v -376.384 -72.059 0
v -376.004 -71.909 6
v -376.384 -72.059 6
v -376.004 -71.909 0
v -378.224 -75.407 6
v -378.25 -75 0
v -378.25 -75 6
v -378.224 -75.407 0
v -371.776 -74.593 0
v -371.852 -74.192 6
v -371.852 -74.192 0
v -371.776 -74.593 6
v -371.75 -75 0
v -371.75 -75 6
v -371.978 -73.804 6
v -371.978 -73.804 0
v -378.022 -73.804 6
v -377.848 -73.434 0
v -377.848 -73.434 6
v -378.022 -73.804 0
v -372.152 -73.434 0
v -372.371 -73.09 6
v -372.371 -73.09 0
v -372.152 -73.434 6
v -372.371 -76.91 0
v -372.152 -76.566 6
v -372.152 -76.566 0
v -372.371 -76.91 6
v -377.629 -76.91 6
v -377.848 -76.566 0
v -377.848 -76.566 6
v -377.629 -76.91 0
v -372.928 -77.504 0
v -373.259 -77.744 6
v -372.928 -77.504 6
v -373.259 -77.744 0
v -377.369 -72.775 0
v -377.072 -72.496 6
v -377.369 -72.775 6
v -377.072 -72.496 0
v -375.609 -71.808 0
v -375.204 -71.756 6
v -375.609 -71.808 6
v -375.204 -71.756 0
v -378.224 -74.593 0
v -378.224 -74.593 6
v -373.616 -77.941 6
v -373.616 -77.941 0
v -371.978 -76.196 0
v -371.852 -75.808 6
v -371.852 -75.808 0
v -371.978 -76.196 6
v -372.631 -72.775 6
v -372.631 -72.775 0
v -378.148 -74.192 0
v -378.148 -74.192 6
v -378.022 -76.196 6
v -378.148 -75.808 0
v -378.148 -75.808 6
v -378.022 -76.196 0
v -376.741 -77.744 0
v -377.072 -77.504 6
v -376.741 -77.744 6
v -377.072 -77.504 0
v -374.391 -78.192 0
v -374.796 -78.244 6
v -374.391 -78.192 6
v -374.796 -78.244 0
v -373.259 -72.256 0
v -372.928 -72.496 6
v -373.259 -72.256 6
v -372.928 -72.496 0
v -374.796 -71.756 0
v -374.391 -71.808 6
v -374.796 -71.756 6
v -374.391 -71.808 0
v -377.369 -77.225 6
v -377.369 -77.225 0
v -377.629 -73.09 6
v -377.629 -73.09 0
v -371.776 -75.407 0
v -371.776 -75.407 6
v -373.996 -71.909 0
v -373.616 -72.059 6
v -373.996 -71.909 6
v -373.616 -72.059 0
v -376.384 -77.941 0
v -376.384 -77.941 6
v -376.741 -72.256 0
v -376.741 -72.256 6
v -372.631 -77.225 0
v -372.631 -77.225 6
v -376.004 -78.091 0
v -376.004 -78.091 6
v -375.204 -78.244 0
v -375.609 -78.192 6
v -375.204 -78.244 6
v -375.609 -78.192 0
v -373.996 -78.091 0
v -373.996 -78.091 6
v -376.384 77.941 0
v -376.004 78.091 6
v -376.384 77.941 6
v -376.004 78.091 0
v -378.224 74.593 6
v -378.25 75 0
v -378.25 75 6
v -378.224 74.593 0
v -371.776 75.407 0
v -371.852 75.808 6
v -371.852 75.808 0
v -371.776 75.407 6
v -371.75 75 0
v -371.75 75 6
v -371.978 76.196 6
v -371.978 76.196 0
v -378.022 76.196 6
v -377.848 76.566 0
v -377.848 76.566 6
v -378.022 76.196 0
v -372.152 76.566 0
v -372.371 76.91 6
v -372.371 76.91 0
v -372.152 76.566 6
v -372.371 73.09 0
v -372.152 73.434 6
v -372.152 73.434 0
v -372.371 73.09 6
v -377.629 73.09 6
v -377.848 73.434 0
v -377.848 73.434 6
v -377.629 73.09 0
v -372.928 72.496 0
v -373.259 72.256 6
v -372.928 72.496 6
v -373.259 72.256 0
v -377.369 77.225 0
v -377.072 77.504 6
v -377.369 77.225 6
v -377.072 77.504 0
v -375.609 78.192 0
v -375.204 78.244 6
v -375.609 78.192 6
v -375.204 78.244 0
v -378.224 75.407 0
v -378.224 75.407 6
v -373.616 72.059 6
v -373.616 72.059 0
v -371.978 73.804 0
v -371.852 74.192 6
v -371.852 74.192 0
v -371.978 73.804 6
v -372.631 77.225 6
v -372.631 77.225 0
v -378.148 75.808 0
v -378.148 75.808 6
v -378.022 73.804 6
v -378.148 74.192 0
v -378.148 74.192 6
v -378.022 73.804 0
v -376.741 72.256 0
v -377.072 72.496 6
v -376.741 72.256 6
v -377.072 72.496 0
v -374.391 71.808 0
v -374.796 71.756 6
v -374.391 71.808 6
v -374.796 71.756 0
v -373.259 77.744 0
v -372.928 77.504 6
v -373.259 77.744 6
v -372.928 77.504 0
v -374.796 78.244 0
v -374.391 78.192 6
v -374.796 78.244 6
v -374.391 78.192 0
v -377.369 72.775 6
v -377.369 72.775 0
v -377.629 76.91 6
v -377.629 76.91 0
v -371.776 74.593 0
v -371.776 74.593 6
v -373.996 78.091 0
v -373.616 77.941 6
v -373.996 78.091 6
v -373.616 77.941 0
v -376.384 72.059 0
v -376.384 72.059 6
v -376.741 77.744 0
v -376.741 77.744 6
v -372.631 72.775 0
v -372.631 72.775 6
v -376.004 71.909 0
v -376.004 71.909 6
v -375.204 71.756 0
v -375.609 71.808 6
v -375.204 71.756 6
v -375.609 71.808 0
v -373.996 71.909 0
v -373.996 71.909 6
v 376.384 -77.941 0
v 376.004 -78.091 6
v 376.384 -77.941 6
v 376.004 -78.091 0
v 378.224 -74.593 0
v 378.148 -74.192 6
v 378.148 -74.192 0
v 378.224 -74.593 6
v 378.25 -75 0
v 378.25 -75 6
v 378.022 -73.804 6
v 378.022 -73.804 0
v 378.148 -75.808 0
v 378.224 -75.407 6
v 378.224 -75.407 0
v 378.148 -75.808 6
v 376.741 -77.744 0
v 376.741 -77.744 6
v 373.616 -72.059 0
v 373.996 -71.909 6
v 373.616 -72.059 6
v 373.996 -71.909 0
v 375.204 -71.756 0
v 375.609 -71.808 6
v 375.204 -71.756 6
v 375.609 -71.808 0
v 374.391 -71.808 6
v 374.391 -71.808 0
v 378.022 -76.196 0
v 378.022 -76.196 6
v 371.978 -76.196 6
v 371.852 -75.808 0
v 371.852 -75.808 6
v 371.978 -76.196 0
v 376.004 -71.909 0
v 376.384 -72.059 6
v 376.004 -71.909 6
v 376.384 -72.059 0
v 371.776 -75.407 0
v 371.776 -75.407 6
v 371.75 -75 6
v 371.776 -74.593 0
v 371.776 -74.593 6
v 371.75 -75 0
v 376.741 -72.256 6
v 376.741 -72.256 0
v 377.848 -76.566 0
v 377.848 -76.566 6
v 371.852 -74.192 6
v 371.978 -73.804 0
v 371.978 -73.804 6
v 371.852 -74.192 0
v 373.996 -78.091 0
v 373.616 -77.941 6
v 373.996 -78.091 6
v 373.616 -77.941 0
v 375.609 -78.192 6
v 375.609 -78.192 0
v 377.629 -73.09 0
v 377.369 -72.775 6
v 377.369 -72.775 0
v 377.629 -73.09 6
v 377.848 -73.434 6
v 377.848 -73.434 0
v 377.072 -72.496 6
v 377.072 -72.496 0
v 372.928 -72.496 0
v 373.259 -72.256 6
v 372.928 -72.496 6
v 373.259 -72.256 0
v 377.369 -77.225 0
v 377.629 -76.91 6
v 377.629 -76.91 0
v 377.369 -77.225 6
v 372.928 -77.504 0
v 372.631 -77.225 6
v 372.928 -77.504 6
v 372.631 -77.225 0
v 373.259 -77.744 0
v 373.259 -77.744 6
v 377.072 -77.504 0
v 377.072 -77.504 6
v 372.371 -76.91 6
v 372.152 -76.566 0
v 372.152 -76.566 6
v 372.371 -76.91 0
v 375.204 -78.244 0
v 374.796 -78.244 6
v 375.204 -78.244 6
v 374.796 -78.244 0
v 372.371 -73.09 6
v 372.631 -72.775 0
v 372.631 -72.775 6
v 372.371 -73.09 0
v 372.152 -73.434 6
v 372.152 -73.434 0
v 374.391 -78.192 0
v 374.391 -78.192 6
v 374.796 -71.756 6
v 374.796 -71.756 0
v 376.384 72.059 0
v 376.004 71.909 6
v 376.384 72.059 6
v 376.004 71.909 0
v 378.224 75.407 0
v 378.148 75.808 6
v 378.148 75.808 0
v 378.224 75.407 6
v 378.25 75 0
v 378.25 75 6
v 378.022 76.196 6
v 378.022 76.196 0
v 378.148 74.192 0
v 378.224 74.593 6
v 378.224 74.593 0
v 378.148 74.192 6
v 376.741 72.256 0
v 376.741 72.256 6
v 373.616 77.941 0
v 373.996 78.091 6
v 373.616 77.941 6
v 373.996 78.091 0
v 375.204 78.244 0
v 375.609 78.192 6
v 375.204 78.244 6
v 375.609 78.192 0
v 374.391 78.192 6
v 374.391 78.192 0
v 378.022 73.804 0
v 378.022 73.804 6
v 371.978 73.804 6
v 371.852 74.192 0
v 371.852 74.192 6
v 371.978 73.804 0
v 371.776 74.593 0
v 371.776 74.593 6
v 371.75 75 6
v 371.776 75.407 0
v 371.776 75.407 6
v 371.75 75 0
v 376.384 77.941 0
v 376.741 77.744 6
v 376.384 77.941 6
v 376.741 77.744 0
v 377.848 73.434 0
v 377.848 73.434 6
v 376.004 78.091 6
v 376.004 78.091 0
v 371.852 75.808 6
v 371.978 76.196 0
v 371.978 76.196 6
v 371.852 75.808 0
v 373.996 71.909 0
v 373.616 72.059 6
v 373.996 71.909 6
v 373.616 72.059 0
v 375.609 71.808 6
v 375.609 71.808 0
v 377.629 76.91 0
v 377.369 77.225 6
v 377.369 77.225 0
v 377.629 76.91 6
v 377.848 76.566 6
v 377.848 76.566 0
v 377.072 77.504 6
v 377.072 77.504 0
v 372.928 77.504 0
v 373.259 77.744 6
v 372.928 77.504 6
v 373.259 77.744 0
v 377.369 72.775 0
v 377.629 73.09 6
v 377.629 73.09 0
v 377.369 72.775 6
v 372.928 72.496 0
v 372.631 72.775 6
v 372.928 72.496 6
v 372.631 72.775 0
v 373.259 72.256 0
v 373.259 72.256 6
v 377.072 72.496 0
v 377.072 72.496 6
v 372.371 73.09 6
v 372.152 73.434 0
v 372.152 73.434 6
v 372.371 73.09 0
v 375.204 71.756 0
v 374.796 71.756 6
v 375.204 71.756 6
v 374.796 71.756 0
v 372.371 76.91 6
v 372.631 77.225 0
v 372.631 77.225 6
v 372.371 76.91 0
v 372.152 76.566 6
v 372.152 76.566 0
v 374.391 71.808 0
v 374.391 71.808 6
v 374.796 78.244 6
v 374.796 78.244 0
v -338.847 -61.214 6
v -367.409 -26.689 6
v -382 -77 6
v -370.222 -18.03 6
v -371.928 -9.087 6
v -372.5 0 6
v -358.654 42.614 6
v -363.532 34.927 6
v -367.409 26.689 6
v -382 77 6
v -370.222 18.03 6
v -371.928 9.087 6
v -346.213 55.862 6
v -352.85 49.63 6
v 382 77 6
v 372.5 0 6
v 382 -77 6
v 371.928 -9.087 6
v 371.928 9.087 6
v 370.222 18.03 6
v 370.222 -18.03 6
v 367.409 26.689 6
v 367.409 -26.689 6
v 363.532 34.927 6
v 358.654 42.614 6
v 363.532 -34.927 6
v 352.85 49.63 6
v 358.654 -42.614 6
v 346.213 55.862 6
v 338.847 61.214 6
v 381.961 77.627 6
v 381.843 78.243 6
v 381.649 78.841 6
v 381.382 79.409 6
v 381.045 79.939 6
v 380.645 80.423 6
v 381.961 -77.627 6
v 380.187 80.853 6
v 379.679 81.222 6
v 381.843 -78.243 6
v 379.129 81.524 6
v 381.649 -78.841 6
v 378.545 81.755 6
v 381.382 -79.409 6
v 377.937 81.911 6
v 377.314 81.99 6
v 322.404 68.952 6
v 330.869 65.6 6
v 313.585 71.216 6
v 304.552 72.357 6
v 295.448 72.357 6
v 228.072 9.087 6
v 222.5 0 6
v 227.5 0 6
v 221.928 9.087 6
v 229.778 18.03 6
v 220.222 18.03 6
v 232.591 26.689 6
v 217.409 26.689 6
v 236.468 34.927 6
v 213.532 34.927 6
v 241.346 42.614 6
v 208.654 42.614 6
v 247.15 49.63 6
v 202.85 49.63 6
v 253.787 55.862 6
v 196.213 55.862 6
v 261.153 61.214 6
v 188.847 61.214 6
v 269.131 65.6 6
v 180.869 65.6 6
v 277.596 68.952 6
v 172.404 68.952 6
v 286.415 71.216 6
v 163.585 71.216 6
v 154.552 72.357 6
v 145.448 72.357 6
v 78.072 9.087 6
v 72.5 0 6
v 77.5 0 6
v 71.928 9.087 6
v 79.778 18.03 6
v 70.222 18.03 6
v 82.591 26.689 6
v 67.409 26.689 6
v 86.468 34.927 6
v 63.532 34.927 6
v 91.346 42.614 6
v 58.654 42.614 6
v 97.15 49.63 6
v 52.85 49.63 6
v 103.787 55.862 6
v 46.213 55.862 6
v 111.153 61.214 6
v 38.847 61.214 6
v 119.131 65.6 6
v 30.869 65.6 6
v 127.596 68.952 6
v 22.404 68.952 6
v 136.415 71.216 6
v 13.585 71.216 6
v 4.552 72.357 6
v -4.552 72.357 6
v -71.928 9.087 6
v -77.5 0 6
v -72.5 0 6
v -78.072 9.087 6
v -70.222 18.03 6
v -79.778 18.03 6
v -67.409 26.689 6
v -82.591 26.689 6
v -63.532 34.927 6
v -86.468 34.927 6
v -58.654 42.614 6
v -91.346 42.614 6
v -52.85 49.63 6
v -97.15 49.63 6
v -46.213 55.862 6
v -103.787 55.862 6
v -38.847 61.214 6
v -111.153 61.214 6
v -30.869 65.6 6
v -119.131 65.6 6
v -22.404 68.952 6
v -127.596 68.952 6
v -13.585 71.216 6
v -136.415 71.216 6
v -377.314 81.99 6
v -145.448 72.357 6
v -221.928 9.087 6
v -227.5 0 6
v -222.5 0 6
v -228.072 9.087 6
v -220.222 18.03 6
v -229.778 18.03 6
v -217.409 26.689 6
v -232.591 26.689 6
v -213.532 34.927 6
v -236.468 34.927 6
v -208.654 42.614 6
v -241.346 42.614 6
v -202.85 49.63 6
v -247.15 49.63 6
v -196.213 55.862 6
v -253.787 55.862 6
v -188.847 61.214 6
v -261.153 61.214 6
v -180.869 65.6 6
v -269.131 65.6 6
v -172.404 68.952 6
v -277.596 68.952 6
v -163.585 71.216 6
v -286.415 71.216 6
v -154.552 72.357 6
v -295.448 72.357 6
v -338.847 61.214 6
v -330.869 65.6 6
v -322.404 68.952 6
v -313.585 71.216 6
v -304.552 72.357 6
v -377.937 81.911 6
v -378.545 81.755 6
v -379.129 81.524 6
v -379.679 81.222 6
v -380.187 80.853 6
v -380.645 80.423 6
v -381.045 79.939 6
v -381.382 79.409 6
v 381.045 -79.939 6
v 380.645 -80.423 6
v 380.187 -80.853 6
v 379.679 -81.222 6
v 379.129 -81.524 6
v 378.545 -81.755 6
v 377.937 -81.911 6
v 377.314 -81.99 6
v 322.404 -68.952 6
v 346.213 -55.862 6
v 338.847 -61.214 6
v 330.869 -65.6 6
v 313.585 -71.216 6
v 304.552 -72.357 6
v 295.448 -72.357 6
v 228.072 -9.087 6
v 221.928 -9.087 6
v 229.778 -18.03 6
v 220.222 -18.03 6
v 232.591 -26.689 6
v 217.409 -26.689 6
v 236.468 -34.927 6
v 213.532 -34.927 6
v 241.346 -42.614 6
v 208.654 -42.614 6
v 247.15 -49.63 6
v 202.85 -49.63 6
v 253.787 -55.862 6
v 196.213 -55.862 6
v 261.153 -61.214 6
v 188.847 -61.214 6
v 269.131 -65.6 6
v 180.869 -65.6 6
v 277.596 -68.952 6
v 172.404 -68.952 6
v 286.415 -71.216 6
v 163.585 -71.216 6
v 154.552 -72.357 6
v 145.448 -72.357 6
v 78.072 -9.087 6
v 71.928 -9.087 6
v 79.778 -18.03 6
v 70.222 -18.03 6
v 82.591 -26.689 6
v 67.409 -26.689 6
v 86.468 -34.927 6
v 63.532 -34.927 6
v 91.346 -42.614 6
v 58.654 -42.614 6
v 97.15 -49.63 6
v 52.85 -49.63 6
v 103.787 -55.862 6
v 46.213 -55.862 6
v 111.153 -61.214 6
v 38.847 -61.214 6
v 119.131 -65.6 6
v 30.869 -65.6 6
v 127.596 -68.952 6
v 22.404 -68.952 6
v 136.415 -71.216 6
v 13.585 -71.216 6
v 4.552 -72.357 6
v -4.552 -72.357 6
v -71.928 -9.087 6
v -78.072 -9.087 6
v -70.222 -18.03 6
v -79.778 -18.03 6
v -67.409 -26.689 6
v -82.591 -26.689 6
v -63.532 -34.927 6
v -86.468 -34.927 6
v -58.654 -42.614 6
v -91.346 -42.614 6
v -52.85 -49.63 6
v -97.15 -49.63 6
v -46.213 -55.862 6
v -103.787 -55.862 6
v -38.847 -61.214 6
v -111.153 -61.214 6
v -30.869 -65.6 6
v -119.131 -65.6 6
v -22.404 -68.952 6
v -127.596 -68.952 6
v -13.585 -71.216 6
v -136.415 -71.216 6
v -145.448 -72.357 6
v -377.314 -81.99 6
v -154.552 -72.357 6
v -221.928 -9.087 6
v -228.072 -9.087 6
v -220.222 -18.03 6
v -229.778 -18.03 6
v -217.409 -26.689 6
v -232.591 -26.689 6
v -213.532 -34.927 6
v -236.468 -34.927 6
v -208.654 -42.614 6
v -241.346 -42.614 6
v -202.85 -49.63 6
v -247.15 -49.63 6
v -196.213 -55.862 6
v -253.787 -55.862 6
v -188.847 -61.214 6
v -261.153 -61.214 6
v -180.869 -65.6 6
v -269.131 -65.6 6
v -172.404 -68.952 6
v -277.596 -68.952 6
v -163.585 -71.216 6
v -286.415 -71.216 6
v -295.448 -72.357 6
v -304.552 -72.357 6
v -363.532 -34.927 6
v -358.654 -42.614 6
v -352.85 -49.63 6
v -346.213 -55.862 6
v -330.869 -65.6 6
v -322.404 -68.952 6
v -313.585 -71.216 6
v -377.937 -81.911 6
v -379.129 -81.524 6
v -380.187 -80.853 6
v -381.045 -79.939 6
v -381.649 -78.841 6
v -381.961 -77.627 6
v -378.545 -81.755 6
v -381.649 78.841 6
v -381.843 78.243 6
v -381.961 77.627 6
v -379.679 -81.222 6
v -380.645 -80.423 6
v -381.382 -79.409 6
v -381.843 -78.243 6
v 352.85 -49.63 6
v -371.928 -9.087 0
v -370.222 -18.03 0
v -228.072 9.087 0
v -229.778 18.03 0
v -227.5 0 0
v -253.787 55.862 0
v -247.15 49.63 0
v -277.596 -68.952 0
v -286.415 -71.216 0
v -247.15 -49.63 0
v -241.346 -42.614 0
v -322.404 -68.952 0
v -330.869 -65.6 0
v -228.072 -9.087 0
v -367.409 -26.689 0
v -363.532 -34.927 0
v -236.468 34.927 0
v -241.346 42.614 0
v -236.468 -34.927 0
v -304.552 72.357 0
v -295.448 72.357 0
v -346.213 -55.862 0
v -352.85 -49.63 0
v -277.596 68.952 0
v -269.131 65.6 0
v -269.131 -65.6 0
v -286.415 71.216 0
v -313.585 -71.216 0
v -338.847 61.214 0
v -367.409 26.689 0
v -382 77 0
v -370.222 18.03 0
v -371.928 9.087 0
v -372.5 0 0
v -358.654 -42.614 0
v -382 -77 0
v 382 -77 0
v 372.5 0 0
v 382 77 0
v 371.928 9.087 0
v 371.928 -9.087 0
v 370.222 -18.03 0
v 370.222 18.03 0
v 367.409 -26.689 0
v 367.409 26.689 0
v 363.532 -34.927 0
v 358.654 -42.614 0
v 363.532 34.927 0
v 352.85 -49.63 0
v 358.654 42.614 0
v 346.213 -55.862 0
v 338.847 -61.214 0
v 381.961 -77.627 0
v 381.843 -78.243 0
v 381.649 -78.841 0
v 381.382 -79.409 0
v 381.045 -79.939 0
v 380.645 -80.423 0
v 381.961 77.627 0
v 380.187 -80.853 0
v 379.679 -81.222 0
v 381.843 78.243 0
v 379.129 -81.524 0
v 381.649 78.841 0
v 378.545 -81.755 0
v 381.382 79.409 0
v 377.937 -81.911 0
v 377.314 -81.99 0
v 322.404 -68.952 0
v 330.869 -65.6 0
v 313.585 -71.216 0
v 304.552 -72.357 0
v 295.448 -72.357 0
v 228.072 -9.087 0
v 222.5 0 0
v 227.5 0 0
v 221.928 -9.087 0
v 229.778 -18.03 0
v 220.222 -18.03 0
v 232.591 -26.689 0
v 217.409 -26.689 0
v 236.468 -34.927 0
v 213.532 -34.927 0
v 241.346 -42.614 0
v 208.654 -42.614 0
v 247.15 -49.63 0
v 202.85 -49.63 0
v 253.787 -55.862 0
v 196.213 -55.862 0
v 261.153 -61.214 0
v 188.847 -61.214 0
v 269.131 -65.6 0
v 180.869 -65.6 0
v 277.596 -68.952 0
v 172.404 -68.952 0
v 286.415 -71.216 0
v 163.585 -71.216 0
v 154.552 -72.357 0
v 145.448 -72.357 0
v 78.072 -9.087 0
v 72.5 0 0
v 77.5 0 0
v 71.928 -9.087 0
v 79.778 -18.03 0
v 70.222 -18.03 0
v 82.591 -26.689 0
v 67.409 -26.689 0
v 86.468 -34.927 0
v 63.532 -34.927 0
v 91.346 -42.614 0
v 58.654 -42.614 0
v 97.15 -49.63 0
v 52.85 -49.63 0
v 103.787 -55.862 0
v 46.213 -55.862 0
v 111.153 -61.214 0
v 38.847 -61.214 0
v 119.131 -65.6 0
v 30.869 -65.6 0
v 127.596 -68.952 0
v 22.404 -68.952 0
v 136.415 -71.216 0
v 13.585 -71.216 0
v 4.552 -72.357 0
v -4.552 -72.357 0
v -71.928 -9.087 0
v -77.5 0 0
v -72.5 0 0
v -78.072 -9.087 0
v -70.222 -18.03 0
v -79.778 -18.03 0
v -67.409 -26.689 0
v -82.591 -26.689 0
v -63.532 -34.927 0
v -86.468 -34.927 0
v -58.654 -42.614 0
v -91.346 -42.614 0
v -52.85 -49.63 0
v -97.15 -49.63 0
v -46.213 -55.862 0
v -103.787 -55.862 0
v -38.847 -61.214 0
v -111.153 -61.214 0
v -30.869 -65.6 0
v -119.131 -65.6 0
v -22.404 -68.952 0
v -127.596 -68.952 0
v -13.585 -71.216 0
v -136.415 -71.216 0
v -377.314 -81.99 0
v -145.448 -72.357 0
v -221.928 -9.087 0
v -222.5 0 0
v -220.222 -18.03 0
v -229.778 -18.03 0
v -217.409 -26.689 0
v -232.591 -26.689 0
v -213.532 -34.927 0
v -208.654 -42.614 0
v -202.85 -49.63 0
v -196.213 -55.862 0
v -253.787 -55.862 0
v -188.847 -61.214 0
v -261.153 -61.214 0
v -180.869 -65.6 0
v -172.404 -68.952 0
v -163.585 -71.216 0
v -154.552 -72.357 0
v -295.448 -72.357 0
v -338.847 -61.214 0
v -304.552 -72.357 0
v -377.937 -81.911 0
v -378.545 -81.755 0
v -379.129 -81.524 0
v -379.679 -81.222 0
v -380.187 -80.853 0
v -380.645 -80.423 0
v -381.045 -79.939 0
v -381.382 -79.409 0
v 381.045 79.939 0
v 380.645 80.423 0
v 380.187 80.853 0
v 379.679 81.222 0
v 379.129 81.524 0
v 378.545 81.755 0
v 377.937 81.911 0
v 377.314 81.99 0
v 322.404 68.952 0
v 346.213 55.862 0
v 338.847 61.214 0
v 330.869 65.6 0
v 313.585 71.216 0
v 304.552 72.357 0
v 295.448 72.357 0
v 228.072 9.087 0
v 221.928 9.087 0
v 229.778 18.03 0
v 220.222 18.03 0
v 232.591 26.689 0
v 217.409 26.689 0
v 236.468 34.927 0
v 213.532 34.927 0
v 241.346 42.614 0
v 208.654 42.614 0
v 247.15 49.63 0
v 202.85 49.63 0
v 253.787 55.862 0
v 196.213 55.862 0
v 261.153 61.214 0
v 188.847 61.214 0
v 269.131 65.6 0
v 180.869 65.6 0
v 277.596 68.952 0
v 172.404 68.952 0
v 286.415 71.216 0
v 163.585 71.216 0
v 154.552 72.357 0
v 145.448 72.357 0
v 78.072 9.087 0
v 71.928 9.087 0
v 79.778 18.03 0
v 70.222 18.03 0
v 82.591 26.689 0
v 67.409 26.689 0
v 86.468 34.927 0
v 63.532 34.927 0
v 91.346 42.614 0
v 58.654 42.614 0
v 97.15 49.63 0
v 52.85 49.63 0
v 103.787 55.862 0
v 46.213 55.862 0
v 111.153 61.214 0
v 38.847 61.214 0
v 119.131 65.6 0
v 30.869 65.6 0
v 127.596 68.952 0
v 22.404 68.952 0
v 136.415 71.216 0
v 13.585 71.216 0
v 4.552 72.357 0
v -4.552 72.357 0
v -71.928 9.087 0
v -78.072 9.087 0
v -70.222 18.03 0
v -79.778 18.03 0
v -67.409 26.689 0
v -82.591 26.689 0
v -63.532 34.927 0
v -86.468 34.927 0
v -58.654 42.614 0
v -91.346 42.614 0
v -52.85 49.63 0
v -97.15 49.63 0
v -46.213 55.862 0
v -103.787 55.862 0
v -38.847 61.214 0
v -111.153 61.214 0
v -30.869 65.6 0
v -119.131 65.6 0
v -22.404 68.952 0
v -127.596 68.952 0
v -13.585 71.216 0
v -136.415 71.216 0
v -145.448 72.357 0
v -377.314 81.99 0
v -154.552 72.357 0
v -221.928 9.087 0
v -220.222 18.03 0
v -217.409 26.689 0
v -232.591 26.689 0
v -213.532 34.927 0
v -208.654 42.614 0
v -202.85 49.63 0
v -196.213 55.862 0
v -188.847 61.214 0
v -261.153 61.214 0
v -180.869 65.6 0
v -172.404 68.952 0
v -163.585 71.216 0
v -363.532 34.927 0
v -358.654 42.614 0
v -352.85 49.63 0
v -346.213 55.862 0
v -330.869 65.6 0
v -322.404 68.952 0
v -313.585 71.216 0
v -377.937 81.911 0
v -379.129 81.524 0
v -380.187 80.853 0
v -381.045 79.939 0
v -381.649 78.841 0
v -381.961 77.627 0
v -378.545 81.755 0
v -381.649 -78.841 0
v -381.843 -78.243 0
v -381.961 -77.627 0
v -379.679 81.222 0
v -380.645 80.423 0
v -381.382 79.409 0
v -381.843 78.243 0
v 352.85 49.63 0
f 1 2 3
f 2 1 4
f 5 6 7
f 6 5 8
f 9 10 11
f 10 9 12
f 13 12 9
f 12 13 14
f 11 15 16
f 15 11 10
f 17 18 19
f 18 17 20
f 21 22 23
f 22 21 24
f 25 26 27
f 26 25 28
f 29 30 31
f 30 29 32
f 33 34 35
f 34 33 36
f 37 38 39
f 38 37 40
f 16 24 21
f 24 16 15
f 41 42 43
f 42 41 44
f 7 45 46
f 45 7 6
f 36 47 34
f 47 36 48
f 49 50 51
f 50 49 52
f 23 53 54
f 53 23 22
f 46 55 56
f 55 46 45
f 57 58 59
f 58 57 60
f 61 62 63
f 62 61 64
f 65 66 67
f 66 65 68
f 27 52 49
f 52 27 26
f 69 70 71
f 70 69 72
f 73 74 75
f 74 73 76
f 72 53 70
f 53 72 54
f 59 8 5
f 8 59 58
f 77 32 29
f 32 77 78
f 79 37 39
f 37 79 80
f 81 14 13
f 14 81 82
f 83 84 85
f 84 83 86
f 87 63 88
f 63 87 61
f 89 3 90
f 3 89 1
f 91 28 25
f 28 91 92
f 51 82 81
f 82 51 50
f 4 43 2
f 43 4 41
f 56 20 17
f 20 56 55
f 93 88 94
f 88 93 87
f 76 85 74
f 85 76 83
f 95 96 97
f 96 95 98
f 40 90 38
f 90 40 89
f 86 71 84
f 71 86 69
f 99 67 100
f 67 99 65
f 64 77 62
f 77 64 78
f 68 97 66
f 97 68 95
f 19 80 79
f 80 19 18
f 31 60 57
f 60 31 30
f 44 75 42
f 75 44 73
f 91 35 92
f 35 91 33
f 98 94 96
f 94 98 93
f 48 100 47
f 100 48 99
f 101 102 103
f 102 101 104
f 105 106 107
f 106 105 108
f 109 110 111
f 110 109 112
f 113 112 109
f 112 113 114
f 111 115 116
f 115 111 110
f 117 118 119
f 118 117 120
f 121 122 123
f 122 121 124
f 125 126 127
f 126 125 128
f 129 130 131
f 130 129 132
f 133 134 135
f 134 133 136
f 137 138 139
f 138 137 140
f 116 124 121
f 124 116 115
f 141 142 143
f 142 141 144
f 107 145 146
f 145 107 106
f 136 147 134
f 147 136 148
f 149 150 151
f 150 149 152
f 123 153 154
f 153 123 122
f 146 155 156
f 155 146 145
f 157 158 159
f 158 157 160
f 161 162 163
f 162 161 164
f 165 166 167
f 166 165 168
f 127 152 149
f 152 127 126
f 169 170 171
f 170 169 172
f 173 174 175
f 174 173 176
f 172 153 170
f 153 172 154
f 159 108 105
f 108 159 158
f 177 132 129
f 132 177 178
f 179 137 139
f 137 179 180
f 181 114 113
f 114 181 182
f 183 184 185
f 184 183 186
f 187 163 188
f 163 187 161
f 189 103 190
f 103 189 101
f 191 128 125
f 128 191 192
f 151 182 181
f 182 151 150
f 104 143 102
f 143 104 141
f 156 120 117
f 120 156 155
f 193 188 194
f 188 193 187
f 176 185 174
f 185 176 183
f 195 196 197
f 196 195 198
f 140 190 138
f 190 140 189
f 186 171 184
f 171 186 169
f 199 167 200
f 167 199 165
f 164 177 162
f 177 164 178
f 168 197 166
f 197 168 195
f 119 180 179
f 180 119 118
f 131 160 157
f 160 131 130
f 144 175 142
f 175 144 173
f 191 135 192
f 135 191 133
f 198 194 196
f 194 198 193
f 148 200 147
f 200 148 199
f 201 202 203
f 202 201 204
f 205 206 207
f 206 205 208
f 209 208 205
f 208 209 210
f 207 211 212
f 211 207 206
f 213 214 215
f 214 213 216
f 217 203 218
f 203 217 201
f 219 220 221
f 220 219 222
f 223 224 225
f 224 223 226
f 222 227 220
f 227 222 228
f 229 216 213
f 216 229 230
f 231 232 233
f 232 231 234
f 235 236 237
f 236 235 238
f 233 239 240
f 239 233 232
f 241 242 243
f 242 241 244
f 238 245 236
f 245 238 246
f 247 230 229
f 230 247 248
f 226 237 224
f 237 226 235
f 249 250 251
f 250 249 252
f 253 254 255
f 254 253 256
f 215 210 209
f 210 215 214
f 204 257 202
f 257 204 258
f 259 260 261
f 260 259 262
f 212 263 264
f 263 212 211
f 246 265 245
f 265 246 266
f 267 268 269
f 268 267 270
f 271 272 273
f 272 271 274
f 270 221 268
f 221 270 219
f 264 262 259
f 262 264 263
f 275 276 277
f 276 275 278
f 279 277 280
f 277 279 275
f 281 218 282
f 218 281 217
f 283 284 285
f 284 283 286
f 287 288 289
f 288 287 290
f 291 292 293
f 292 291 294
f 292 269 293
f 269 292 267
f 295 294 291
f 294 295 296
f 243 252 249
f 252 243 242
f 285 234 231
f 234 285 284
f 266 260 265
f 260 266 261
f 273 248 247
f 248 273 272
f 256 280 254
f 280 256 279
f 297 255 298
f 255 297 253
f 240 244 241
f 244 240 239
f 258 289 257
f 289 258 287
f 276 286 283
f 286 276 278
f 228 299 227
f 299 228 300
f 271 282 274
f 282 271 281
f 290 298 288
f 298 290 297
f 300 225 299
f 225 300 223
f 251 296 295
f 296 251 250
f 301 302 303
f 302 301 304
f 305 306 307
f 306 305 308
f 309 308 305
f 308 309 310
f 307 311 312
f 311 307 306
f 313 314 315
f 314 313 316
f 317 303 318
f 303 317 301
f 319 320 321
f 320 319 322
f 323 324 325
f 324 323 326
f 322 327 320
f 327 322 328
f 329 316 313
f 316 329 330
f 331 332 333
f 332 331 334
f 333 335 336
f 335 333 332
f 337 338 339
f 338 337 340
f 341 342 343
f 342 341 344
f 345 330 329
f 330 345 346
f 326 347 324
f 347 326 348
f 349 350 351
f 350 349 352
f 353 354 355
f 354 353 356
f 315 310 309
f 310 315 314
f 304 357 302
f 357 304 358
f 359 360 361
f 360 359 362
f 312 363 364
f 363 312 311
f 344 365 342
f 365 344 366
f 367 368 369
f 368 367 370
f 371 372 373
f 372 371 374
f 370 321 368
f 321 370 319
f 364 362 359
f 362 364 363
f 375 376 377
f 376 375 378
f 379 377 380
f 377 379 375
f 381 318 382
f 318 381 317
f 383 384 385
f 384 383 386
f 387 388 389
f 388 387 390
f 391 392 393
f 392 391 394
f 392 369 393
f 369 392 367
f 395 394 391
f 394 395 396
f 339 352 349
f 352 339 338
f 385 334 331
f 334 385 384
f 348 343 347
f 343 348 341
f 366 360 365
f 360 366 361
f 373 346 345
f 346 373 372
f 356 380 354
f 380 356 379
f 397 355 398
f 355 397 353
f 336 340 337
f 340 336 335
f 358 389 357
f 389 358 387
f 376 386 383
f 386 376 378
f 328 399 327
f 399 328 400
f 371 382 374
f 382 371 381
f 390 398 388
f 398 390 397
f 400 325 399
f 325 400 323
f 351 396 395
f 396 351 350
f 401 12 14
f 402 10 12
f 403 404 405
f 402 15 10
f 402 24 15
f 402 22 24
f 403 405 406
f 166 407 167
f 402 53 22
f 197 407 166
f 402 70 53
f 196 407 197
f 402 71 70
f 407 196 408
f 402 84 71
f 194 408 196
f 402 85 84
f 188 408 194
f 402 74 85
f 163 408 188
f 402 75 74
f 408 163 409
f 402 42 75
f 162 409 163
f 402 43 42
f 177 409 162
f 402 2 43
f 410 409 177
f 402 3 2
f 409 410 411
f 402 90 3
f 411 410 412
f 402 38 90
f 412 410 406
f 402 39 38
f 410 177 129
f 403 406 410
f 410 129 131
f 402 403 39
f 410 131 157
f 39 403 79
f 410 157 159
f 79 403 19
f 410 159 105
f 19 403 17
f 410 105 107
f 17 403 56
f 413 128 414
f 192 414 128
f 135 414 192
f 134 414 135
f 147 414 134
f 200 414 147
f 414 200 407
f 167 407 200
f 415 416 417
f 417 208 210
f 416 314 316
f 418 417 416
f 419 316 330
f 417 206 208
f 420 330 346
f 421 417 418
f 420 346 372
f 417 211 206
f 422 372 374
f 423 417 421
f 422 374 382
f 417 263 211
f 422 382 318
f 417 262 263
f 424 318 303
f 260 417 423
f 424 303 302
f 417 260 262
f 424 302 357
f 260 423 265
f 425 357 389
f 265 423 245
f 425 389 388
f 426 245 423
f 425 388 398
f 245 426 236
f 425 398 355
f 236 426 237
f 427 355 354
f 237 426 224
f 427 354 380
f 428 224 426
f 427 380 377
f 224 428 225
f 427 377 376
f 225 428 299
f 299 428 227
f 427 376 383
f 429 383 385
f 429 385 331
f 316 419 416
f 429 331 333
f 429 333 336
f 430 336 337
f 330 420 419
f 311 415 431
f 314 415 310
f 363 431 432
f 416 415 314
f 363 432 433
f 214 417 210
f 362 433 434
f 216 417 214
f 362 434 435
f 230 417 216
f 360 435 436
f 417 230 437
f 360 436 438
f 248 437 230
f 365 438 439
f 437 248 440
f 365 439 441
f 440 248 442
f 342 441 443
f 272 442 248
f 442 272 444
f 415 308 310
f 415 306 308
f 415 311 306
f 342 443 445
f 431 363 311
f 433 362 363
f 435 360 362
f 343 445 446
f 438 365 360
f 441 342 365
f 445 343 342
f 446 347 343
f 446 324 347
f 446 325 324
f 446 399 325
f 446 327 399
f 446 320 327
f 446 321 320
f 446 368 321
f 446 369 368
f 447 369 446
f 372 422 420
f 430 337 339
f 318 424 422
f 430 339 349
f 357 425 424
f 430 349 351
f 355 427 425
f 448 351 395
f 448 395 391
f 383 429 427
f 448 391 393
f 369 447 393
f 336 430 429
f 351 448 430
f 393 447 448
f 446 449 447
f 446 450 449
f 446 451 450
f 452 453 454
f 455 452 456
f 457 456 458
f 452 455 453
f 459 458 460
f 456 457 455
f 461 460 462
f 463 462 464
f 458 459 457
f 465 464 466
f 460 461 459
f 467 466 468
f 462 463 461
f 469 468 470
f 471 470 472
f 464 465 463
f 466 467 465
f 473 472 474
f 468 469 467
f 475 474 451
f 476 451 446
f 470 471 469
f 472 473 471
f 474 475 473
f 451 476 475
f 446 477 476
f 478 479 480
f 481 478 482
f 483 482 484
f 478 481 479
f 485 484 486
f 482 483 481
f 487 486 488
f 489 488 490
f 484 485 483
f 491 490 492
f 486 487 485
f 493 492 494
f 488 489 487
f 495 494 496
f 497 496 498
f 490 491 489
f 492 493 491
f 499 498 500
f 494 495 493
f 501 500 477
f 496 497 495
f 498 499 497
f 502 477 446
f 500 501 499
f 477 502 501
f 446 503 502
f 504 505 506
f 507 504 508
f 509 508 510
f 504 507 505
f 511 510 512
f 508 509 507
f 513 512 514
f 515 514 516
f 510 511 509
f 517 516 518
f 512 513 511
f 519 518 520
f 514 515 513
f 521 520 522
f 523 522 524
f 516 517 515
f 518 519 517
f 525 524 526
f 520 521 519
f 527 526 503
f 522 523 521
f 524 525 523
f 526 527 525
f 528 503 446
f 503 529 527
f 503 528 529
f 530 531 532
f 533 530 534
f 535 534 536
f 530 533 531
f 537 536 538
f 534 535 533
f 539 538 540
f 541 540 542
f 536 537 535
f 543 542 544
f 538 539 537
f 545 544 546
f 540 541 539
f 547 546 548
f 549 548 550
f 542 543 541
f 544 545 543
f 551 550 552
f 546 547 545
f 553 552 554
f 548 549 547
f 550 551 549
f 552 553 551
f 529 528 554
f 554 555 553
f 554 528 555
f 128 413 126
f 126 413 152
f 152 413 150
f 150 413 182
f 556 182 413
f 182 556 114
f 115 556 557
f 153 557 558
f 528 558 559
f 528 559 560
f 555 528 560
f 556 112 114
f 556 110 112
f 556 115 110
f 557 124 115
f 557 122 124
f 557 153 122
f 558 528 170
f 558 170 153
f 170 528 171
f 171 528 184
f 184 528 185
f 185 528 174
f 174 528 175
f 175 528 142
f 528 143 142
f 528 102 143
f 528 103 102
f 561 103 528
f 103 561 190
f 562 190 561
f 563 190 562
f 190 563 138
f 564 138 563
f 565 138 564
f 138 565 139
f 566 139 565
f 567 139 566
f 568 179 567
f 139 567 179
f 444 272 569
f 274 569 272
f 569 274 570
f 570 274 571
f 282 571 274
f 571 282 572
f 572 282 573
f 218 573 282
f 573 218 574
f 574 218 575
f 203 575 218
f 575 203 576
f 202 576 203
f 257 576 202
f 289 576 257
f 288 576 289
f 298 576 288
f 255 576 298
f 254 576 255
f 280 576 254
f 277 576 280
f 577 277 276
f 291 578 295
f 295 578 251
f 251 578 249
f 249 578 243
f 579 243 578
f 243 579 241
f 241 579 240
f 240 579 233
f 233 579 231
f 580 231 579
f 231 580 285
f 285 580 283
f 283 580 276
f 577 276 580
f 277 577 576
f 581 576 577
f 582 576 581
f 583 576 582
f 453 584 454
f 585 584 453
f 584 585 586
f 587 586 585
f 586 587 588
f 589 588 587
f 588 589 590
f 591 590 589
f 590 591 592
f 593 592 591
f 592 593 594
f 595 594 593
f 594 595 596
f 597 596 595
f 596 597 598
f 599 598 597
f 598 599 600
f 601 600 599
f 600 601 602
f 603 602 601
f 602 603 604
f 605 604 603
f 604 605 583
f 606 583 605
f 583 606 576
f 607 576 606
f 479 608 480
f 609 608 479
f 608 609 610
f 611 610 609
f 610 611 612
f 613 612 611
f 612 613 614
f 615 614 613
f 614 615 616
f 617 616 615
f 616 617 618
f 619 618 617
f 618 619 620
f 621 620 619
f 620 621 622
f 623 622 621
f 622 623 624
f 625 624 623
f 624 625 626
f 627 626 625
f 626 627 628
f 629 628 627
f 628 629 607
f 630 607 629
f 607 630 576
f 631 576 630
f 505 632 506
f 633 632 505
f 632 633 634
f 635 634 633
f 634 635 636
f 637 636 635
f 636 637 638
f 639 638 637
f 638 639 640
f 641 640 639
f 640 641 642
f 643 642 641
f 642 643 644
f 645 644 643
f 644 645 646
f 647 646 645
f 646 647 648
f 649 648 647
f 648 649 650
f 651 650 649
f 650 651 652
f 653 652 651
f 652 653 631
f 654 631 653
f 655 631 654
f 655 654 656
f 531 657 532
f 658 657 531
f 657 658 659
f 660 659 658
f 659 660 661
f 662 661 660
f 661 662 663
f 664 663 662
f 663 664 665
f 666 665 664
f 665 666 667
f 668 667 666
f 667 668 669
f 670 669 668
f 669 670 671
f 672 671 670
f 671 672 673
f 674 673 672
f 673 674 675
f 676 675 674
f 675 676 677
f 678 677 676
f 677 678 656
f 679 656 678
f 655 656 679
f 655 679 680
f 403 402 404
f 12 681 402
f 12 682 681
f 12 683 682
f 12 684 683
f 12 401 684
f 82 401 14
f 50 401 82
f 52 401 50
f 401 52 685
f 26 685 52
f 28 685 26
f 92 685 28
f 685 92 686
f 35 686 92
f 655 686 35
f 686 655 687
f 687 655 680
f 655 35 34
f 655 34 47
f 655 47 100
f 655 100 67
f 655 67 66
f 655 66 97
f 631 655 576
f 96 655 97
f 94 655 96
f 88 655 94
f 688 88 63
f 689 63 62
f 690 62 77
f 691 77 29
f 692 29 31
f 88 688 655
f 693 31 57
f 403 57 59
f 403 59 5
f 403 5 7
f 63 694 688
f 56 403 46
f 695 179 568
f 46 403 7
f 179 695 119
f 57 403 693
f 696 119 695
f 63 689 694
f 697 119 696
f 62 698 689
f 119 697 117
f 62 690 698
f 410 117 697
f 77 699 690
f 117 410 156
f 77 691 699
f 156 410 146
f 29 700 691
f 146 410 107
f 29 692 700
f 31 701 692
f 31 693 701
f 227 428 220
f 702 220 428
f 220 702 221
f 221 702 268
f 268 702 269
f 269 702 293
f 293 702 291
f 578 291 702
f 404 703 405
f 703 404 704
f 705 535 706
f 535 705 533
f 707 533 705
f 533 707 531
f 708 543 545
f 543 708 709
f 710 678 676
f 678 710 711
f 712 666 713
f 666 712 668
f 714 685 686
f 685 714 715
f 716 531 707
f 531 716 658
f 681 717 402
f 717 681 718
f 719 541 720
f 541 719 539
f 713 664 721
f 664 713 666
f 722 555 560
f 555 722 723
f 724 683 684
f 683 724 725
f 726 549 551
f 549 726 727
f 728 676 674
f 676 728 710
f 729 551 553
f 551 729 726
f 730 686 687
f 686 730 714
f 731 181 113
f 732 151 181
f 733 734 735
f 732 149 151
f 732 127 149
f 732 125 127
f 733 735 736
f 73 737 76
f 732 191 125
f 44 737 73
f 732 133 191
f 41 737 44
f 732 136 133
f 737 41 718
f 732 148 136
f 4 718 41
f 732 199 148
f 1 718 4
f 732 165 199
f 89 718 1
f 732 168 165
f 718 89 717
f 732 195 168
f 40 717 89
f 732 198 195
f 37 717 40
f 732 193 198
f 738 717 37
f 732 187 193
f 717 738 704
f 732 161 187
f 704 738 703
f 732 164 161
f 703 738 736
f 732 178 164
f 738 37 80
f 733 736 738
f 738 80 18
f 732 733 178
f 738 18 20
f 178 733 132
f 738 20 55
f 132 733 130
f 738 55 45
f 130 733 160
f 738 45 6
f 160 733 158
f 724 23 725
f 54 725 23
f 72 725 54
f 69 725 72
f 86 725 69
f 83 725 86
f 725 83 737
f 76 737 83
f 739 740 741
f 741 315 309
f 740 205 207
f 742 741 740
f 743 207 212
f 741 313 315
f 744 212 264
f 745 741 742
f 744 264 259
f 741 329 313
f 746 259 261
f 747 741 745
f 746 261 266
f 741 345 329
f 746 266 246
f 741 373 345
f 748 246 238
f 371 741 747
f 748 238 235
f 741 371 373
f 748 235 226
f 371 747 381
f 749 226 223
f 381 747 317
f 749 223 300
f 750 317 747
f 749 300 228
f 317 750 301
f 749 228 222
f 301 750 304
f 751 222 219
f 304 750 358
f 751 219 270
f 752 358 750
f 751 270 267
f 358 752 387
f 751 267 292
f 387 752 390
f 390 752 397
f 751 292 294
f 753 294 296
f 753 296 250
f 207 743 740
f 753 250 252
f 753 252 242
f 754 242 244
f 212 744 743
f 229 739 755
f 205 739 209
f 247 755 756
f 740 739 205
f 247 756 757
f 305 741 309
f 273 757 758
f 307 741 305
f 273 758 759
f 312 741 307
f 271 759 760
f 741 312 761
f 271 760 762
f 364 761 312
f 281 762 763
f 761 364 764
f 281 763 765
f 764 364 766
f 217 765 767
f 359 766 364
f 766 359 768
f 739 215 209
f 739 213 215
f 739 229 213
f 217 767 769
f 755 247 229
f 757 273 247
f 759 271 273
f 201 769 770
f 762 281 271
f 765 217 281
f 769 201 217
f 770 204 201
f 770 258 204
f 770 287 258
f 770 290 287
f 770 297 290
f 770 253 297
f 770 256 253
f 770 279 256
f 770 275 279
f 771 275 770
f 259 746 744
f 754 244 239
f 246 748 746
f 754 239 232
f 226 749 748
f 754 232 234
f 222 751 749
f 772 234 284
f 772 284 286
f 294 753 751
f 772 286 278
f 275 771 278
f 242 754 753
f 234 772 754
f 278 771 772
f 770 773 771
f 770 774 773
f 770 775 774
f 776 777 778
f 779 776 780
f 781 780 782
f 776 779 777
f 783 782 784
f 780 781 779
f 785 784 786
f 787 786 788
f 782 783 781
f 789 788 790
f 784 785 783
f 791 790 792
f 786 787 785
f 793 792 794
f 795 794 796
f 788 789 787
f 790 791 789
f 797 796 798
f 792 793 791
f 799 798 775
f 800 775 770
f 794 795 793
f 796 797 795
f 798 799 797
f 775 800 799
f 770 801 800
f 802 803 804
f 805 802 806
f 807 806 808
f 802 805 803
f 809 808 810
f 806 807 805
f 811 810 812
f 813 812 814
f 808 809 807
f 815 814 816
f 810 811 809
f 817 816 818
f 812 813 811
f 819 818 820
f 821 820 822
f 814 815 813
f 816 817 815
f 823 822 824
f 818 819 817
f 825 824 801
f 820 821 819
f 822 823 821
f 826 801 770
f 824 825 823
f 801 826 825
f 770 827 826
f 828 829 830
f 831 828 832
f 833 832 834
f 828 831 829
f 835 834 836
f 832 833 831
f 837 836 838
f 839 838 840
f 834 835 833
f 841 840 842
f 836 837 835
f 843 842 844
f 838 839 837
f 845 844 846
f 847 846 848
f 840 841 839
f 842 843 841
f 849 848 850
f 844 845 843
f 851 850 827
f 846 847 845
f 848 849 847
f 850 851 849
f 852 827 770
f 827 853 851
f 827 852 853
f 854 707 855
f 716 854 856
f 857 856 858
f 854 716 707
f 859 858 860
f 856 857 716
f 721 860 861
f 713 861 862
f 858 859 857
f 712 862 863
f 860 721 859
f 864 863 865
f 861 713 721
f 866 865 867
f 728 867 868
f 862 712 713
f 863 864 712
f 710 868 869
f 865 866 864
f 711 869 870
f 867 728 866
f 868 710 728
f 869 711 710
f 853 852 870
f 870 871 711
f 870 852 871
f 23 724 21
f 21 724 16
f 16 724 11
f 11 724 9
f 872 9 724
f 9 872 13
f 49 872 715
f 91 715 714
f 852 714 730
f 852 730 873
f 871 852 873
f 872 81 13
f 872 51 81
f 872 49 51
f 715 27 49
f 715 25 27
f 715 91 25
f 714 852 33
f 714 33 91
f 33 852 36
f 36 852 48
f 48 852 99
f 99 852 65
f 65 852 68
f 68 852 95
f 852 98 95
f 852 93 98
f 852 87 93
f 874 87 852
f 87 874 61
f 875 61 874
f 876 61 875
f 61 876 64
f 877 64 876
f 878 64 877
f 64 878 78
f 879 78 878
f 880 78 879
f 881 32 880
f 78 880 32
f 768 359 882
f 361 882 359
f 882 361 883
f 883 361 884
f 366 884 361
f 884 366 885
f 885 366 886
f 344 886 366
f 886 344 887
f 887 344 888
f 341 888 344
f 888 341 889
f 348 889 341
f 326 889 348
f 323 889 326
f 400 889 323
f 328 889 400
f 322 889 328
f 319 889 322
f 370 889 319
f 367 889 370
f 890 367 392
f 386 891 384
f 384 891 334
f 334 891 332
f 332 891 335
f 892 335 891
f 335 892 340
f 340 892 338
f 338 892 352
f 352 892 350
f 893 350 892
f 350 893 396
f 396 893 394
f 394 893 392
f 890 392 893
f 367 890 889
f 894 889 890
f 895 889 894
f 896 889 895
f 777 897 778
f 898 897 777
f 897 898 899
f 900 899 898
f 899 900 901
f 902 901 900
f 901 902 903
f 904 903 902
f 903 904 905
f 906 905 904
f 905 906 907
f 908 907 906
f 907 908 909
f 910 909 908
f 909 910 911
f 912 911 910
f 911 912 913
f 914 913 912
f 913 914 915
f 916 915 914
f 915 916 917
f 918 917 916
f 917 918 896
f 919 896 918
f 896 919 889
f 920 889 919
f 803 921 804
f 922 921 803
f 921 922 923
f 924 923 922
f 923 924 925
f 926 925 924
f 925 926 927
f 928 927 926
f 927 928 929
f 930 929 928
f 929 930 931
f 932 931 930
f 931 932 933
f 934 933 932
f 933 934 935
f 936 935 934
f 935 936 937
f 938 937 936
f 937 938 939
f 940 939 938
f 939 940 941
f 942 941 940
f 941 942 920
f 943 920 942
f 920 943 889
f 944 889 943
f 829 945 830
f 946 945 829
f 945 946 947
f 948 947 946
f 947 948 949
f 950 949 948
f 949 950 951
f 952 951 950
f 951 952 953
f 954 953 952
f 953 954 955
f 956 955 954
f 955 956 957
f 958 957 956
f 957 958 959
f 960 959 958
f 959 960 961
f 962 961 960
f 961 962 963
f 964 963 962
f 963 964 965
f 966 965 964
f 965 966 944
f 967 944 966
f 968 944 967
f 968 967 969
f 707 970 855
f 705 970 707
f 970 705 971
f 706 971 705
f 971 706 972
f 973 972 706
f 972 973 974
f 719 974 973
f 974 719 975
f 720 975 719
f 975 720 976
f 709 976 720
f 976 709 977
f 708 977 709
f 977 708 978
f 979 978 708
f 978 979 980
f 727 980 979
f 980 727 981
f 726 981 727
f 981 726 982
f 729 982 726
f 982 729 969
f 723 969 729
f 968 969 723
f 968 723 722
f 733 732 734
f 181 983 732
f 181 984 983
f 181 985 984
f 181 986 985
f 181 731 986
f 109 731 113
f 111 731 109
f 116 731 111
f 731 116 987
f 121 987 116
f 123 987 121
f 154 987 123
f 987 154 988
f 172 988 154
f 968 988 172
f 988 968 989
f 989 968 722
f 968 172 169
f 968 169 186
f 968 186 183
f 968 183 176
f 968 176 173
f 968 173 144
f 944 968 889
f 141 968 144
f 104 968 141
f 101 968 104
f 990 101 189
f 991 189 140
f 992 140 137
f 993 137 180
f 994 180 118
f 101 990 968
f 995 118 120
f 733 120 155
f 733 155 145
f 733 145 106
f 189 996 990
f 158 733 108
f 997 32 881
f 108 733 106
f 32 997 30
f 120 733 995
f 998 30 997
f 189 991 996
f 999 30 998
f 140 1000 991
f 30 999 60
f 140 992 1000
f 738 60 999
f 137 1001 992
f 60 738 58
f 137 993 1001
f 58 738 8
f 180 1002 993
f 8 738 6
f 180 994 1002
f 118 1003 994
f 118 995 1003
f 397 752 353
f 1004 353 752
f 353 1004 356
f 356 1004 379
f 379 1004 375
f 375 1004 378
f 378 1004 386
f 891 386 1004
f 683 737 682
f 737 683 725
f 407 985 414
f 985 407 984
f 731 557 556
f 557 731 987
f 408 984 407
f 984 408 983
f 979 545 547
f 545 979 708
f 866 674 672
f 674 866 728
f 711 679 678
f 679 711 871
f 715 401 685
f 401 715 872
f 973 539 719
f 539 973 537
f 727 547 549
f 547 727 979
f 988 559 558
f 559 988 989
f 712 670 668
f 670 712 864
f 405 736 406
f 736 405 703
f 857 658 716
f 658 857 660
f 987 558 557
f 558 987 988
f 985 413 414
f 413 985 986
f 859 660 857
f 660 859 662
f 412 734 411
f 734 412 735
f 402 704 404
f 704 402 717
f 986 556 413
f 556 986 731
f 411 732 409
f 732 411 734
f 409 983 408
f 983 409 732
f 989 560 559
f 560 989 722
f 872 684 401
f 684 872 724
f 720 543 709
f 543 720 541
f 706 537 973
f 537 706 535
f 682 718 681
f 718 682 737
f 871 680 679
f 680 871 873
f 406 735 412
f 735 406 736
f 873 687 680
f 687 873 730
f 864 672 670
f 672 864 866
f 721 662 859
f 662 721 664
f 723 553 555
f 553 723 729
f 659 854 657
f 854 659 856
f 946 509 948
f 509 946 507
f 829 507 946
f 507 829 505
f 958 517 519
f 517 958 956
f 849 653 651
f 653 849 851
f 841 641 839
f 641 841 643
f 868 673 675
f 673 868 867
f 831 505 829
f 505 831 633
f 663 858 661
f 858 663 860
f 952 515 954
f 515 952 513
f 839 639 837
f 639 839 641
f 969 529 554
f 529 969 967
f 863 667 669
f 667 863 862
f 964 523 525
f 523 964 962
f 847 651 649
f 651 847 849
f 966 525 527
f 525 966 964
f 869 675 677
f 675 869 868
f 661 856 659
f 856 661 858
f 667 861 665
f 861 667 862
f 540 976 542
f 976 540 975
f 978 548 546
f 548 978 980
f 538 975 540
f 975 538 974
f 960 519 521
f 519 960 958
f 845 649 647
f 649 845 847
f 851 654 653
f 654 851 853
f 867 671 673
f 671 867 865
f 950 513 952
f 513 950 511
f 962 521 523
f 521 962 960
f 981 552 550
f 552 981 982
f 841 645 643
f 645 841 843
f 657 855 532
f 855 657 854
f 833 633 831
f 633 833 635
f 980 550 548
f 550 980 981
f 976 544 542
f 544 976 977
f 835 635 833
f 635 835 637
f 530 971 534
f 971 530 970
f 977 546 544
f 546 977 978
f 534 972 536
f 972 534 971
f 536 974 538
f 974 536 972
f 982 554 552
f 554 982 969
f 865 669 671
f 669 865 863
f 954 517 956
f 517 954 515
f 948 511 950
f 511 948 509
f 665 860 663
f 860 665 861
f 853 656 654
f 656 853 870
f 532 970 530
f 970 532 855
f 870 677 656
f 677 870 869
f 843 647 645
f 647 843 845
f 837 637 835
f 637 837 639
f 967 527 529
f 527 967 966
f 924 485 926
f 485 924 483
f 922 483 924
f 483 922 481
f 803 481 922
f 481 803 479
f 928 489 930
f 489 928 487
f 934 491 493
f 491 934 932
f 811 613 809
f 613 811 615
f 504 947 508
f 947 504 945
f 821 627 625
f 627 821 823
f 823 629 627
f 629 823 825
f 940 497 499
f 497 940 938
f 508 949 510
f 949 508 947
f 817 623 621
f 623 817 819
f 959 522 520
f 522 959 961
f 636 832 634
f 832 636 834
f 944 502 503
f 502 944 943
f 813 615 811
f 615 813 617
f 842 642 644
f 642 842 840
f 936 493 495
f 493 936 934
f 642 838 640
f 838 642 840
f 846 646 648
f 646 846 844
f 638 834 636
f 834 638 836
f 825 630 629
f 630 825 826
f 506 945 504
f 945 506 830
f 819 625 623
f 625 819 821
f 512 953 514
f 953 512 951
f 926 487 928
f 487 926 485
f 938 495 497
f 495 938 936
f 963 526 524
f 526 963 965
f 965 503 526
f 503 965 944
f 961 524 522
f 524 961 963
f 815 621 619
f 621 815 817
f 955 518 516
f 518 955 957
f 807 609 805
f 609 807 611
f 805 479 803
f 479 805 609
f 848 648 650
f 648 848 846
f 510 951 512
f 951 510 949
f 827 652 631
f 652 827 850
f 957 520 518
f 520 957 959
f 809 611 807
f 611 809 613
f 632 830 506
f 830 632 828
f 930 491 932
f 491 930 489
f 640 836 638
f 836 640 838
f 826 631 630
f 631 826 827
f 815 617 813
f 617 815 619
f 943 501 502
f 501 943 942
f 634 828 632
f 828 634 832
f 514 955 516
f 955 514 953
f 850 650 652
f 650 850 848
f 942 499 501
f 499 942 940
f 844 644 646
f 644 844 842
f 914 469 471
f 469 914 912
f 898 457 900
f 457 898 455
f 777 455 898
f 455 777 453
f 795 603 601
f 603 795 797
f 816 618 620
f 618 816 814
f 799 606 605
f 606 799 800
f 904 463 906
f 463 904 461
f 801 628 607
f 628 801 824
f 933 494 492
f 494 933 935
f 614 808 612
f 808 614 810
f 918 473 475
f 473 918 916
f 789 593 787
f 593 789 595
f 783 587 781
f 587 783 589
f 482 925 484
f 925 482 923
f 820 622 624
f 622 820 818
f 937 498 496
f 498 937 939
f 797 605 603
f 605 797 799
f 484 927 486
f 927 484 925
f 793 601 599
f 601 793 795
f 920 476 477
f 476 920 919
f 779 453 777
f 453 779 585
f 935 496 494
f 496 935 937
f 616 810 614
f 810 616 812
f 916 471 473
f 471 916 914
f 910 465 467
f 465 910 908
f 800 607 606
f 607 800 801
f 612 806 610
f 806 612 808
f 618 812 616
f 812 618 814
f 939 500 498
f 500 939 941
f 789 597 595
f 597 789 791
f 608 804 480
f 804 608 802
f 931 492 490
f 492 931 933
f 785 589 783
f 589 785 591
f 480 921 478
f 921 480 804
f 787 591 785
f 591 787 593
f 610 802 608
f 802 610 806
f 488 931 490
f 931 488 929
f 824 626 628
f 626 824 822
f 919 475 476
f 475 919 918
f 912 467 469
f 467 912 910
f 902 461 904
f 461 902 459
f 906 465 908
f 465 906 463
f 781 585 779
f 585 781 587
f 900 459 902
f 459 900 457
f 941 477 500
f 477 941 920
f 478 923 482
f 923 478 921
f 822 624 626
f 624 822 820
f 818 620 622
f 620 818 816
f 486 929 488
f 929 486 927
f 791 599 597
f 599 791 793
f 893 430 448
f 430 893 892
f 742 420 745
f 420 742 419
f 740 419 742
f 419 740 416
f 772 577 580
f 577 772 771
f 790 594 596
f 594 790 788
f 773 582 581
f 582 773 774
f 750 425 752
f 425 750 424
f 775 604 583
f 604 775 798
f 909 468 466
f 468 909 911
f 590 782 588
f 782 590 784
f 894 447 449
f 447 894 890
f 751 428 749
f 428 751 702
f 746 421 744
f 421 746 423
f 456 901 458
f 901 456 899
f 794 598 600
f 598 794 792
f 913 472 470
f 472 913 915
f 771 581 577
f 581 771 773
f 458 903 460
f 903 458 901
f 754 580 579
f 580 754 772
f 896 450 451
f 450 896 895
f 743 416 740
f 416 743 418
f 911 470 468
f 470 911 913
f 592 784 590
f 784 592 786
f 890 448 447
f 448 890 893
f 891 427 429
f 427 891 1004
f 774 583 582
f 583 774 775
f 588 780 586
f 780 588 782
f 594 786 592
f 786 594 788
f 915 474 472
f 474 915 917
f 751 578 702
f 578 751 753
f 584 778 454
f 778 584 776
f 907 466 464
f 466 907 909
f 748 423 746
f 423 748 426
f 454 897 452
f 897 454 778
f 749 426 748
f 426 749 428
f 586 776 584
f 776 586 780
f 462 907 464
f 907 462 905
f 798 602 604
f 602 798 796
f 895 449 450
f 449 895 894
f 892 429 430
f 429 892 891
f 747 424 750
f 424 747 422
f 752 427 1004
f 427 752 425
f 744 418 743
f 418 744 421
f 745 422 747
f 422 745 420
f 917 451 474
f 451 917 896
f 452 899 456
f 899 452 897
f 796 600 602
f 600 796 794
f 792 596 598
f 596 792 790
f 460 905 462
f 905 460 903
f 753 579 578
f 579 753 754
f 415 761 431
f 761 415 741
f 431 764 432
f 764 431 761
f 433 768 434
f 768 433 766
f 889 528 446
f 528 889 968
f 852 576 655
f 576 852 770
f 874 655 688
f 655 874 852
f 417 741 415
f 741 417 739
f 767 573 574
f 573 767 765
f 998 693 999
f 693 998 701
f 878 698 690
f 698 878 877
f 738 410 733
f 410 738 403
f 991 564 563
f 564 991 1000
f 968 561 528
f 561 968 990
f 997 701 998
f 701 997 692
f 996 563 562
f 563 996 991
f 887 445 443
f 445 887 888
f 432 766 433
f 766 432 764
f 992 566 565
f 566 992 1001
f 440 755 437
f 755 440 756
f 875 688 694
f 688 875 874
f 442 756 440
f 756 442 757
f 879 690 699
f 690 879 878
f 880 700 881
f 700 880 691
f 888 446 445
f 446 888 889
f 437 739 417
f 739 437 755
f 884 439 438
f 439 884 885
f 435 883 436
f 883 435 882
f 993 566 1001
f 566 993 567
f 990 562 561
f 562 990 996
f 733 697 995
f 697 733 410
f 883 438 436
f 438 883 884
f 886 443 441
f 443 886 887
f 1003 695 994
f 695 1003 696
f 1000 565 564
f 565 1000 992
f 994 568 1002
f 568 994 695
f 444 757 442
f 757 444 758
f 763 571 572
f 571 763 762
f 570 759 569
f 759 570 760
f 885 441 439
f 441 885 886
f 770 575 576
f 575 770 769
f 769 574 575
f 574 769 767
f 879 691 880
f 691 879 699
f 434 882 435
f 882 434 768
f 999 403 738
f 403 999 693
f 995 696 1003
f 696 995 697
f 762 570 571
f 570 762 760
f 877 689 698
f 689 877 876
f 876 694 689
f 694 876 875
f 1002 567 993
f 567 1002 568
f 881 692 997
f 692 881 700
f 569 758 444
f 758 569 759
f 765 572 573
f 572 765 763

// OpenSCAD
$fn = 50;


difference() {
	union() {
		hull() {
			translate(v = [-377.0000000000, 77.0000000000, 0]) {
				cylinder(h = 6, r = 5);
			}
			translate(v = [377.0000000000, 77.0000000000, 0]) {
				cylinder(h = 6, r = 5);
			}
			translate(v = [-377.0000000000, -77.0000000000, 0]) {
				cylinder(h = 6, r = 5);
			}
			translate(v = [377.0000000000, -77.0000000000, 0]) {
				cylinder(h = 6, r = 5);
			}
		}
	}
	union() {
		#translate(v = [-375.0000000000, -75.0000000000, -100.0000000000]) {
			cylinder(h = 200, r = 3.2500000000);
		}
		#translate(v = [-375.0000000000, 75.0000000000, -100.0000000000]) {
			cylinder(h = 200, r = 3.2500000000);
		}
		#translate(v = [375.0000000000, -75.0000000000, -100.0000000000]) {
			cylinder(h = 200, r = 3.2500000000);
		}
		#translate(v = [375.0000000000, 75.0000000000, -100.0000000000]) {
			cylinder(h = 200, r = 3.2500000000);
		}
		#translate(v = [-300.0000000000, 0, 0]) {
			cylinder(h = 6, r = 72.5000000000);
		}
		#translate(v = [-150.0000000000, 0, 0]) {
			cylinder(h = 6, r = 72.5000000000);
		}
		#cylinder(h = 6, r = 72.5000000000);
		#translate(v = [150.0000000000, 0, 0]) {
			cylinder(h = 6, r = 72.5000000000);
		}
		#translate(v = [300.0000000000, 0, 0]) {
			cylinder(h = 6, r = 72.5000000000);
		}
	}
}
